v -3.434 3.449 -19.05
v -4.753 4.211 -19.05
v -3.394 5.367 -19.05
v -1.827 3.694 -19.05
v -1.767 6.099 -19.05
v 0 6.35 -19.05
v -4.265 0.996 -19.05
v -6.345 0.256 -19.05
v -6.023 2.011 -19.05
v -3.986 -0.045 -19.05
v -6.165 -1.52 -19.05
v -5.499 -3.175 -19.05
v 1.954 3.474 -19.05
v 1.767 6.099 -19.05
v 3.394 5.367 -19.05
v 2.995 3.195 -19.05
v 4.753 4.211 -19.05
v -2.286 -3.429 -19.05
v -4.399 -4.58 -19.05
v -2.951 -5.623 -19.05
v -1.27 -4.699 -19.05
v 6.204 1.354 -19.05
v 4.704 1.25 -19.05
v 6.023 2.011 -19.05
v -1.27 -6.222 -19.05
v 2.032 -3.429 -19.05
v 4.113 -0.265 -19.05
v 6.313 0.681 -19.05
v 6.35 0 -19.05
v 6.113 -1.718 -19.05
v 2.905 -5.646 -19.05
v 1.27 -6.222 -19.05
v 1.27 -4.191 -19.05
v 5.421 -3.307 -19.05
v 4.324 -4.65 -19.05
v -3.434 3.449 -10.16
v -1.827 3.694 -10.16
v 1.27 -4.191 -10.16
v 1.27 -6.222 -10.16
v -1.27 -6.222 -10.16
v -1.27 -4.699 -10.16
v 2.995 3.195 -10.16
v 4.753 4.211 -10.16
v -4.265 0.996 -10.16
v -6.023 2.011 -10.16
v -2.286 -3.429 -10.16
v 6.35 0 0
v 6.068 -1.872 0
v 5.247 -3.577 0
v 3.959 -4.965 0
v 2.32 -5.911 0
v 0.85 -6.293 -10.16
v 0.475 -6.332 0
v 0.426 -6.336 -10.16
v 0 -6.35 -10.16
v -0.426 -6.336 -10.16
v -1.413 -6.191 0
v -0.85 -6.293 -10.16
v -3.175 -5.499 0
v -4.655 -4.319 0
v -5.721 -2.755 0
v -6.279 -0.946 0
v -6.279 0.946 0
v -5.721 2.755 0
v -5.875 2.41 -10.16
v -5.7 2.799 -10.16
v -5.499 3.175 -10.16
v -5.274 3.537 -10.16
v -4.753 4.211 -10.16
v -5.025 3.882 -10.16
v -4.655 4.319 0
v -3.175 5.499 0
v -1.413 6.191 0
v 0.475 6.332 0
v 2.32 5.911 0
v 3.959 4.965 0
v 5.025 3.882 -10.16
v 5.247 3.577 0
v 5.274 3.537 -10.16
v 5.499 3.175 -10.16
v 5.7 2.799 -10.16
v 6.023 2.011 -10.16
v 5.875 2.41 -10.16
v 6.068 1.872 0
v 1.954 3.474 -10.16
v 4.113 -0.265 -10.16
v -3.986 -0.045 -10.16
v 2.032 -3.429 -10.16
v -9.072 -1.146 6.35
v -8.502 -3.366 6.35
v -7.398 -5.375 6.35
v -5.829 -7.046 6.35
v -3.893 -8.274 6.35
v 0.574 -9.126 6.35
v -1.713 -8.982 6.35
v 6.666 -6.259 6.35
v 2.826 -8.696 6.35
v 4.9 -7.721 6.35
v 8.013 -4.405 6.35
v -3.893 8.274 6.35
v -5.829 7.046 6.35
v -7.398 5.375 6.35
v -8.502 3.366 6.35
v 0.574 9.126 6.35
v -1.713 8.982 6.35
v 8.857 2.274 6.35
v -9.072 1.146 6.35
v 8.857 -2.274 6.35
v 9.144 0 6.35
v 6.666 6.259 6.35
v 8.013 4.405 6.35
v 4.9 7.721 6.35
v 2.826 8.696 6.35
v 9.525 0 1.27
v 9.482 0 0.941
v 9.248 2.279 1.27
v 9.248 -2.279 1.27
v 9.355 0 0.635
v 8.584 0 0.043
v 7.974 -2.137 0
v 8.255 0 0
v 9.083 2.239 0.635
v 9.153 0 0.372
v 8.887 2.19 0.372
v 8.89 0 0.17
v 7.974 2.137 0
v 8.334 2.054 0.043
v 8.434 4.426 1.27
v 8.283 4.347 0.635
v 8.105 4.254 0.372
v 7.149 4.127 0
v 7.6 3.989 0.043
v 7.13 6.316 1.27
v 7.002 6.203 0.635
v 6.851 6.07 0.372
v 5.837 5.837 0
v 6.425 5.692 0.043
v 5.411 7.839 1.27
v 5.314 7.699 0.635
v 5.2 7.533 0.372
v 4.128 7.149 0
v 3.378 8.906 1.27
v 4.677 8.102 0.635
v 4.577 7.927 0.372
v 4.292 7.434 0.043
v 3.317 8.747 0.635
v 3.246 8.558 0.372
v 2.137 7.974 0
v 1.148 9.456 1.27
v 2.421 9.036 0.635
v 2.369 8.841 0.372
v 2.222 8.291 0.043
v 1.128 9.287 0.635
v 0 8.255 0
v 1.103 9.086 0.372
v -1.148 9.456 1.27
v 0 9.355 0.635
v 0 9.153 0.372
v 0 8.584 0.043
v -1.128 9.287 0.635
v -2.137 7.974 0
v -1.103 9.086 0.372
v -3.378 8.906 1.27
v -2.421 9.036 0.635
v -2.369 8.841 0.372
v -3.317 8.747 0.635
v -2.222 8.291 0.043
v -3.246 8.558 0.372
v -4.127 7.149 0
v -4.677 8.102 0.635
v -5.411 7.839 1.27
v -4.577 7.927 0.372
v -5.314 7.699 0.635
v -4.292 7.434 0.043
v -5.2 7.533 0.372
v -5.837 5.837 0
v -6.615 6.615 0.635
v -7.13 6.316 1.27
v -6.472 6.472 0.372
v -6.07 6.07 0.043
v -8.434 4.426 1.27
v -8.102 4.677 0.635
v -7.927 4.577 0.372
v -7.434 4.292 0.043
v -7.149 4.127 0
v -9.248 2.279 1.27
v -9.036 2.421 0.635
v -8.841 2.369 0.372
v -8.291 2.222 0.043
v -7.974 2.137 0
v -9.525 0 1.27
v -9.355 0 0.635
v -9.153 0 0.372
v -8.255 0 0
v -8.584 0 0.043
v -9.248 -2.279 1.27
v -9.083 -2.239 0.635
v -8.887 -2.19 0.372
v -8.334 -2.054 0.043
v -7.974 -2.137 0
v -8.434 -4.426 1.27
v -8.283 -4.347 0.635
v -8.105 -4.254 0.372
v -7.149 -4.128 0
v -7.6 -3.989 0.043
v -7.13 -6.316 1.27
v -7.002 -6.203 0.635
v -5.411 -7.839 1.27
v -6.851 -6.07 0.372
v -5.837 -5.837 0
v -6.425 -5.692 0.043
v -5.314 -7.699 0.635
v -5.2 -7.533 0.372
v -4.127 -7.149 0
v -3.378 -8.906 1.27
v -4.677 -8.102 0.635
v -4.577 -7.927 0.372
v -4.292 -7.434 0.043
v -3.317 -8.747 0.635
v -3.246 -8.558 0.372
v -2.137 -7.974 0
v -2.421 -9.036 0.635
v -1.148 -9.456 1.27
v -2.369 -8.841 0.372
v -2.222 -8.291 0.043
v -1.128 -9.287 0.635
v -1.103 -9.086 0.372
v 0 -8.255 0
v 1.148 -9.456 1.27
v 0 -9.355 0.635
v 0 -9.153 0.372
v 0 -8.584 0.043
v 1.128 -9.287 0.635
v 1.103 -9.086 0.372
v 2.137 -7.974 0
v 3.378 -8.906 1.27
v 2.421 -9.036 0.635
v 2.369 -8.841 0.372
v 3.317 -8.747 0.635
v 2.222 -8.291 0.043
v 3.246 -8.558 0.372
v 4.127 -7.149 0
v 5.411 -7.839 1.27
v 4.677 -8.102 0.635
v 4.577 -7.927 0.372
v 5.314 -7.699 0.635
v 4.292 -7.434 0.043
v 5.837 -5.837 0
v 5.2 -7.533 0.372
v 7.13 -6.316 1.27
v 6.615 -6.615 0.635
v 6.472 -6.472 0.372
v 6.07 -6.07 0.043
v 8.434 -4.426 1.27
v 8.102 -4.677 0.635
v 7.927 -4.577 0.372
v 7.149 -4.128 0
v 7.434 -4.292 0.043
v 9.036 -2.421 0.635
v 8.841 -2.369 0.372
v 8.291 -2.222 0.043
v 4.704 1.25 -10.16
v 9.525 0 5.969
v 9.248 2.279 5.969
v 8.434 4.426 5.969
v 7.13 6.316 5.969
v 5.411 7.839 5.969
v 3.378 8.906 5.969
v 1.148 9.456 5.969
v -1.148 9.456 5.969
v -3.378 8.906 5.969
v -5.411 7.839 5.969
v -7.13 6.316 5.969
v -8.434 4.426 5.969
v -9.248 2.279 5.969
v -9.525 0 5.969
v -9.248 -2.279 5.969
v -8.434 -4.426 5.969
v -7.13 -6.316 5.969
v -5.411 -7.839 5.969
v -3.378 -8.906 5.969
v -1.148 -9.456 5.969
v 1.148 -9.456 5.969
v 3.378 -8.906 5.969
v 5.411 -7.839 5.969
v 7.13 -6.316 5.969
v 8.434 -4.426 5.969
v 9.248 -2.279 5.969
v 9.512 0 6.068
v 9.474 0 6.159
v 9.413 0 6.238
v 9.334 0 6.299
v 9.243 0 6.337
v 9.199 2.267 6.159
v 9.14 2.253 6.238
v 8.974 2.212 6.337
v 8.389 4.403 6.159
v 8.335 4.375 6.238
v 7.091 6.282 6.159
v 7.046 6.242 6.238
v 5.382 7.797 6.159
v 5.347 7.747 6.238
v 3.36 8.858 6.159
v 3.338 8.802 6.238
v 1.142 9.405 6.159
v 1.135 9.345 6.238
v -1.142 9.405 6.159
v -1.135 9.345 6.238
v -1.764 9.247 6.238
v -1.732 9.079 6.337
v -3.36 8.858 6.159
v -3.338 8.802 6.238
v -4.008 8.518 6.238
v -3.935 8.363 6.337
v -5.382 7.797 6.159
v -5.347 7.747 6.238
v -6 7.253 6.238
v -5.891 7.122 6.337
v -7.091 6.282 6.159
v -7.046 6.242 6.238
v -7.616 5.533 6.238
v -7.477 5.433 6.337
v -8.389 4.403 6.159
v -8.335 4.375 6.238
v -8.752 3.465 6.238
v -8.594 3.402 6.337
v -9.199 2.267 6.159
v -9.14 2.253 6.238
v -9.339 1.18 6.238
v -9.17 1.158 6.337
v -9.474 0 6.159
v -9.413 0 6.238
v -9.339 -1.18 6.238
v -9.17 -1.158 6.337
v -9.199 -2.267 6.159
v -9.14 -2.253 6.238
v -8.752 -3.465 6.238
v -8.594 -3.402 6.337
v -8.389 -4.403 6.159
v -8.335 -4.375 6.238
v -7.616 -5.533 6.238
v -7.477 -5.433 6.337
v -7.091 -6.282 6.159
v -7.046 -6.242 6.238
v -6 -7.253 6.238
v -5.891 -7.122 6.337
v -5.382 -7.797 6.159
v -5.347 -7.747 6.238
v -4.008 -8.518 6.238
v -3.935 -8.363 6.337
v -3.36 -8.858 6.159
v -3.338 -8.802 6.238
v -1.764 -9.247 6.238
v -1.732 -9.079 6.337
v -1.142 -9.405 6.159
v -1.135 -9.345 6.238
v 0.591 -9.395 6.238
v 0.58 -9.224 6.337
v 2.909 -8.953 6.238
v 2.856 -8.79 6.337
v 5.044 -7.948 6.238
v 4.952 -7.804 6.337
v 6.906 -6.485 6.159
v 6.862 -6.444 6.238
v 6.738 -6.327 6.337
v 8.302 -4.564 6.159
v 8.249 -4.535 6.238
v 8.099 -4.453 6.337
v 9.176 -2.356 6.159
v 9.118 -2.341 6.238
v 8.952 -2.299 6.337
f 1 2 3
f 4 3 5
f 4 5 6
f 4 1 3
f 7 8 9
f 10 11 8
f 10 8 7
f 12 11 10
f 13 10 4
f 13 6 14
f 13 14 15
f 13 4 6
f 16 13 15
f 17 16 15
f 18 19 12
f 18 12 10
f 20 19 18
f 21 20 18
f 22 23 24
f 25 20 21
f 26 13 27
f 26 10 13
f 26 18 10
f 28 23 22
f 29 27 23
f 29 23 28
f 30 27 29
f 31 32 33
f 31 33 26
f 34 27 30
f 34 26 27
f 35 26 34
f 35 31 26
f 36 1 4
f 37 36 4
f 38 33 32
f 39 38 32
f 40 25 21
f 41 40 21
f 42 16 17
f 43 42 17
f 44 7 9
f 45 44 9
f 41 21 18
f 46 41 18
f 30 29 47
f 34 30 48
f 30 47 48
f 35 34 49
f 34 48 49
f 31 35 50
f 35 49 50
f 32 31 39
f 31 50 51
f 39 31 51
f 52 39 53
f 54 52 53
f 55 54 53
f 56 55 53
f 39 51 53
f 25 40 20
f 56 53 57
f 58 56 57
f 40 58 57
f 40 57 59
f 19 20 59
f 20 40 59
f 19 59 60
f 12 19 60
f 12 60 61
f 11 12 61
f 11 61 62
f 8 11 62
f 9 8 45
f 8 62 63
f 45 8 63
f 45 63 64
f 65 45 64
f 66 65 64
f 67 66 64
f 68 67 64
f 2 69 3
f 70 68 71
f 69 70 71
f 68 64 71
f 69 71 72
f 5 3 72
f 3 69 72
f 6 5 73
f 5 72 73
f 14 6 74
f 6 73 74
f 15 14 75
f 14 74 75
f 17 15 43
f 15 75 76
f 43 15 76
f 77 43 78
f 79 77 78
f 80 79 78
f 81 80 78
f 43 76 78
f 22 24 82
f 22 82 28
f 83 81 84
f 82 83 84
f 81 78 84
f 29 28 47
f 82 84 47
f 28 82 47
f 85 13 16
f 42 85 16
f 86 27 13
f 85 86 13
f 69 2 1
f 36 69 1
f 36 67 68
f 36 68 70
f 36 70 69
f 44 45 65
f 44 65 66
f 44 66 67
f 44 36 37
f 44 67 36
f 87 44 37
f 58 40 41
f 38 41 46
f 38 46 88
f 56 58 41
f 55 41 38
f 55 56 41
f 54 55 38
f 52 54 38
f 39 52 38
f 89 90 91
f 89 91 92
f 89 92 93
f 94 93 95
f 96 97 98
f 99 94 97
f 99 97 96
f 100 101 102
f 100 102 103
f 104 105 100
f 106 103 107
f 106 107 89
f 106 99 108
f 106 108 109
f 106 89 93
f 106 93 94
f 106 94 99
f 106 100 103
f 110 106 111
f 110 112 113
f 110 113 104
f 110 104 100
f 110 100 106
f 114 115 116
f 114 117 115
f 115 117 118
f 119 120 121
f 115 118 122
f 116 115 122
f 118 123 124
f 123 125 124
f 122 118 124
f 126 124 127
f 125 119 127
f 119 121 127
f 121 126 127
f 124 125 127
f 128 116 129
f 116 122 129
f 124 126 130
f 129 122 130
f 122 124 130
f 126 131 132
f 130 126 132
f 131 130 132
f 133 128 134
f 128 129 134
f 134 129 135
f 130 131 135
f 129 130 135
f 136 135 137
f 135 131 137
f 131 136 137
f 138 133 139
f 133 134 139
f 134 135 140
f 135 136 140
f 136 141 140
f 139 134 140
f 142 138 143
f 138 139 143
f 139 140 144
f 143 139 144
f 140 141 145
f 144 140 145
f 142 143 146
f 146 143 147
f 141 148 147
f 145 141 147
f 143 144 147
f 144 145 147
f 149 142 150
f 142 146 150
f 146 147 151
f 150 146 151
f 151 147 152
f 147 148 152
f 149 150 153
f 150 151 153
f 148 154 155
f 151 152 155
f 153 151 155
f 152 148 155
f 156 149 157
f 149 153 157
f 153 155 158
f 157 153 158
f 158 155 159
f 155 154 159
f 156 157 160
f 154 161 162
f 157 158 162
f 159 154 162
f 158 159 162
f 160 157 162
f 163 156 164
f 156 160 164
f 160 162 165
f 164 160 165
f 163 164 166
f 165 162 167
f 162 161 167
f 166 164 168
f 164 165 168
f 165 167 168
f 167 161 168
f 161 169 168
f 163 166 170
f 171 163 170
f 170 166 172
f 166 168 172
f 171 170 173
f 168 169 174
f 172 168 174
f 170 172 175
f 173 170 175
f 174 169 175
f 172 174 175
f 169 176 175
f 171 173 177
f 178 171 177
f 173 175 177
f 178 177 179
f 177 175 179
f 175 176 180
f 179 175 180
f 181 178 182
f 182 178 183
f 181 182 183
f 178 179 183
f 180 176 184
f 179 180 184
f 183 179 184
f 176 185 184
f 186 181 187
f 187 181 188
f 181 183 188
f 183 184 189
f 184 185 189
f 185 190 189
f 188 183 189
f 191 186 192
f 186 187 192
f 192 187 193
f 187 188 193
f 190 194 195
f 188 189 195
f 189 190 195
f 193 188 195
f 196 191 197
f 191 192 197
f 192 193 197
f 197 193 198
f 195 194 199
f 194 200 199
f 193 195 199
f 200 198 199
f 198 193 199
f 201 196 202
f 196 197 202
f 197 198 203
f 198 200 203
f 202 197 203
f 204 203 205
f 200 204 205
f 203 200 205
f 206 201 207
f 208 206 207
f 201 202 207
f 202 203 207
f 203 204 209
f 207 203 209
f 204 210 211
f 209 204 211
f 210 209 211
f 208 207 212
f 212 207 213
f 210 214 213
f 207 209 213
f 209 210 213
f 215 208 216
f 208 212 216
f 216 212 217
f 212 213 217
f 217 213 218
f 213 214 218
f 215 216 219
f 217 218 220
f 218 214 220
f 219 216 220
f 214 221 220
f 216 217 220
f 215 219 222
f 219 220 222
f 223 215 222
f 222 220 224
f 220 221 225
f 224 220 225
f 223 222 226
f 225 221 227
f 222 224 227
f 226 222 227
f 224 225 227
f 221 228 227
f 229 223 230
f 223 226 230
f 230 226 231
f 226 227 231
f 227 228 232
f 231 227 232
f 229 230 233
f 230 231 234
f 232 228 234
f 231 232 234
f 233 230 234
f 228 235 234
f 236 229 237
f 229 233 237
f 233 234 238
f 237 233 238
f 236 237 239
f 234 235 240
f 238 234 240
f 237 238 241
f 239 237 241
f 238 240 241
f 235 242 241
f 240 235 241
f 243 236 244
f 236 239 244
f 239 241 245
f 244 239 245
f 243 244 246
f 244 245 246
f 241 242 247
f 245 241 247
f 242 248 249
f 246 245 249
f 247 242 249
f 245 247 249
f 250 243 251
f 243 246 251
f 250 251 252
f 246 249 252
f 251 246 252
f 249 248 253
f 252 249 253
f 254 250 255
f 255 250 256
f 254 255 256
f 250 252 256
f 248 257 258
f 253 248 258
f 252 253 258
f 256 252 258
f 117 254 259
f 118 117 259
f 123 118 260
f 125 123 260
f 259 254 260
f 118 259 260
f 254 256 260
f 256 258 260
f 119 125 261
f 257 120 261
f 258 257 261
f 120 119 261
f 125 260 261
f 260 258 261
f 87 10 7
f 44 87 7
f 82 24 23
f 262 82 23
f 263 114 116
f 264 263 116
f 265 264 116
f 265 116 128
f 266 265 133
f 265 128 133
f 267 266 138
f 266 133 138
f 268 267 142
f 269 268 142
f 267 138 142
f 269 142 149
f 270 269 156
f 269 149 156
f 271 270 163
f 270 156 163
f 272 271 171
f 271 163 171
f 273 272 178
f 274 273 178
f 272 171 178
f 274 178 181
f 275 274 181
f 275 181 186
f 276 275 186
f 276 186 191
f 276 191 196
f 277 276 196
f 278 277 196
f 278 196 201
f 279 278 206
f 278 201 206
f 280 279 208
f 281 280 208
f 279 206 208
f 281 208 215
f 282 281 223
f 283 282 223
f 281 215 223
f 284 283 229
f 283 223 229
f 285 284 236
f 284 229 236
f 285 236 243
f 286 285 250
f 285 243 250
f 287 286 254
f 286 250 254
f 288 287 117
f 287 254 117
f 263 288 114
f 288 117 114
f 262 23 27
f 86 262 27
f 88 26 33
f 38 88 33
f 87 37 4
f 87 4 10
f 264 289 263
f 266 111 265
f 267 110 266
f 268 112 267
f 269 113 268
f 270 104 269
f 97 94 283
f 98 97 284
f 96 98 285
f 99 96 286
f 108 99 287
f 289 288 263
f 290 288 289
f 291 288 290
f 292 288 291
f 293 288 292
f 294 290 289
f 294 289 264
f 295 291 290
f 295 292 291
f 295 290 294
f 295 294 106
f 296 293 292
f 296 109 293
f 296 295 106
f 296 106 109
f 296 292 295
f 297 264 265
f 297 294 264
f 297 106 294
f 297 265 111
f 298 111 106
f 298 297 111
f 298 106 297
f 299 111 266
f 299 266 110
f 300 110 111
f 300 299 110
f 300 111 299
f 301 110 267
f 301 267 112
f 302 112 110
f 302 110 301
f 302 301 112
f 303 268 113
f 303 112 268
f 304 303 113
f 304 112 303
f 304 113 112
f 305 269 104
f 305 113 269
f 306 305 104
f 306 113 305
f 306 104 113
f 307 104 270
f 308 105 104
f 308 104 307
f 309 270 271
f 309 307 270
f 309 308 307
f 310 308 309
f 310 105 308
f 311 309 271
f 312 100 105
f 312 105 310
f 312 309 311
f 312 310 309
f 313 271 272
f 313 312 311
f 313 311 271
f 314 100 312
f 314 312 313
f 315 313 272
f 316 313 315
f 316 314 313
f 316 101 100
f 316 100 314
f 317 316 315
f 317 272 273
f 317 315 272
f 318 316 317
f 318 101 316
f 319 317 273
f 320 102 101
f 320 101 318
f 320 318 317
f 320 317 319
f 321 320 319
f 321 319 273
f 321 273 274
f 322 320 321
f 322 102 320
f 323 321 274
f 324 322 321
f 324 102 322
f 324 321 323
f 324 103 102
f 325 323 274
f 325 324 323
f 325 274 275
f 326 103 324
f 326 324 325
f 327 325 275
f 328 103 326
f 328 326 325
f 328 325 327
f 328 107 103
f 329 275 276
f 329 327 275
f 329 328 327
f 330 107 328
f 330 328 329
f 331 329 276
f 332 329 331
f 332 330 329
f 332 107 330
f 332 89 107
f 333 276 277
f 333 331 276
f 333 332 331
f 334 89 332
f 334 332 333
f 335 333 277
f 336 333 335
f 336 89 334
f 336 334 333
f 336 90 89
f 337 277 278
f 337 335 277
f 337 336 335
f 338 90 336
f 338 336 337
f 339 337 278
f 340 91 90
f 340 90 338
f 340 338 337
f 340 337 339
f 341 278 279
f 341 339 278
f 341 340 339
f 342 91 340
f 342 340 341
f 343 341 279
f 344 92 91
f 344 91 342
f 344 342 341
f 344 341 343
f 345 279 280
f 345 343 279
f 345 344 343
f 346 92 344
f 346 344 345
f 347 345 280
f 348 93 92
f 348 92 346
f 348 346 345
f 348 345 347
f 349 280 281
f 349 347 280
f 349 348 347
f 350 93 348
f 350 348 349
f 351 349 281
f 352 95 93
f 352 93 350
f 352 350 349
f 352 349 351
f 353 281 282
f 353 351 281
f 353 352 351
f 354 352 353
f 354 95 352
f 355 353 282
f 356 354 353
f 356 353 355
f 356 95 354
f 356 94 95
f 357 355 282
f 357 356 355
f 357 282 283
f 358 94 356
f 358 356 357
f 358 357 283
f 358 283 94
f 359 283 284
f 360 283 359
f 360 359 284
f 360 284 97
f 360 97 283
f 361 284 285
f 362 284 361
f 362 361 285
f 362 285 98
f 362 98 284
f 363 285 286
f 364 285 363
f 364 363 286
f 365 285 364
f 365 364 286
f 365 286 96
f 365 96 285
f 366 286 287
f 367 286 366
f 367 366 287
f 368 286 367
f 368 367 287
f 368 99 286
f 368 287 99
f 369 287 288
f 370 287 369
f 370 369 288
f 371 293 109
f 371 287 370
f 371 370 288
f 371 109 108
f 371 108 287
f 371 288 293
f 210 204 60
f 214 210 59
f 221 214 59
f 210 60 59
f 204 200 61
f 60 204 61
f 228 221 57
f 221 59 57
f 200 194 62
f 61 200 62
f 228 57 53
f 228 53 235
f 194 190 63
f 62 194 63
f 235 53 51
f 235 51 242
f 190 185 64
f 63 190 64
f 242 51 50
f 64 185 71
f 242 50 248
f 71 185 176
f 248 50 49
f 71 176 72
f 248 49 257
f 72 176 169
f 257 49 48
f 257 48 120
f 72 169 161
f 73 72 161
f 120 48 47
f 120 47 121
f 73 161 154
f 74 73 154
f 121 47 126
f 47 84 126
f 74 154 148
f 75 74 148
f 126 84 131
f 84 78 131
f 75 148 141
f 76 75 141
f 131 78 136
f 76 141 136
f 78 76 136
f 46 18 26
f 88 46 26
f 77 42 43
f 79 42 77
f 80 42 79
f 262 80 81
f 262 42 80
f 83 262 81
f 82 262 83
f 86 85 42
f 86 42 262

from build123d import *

# Parameters (mm, degrees)
F0_R     = 9.525
F1_DEPTH = 6.35
F2_R     = 6.35
F3_DEPTH = 19.05
F5_DEPTH = 8.89
F6_R     = 1.27
F7_R     = 0.381


with BuildPart() as f1:
    # F0 (on Top) → F1 (new body)
    with BuildSketch(Plane.XY):
        Circle(F0_R)
    extrude(amount=F1_DEPTH)

    # F2 (on face) → F3 (join)
    with BuildSketch(Plane(origin=(0, 0, 0), x_dir=(1, 0, 0), z_dir=(0, 0, -1))):
        Circle(F2_R)
    extrude(amount=F3_DEPTH)

    # F4 (on face) → F5 (cut)
    with BuildSketch(Plane(origin=(0, 0, -19.05), x_dir=(1, 0, 0), z_dir=(0, 0, -1))):
        with BuildLine():
            ThreePointArc((1.27, 6.2217039467), (0.6382319087, 6.3178445716), (0, 6.35))
            ThreePointArc((0, 6.35), (-0.6382319087, 6.3178445716), (-1.27, 6.2217039467))
            Line((-1.27, 6.2217039467), (-1.27, 4.699))
            Line((-1.27, 4.699), (-2.286, 3.429))
            Line((-2.286, 3.429), (1.27, 3.429))
            Line((1.27, 3.429), (2.032, 3.429))
            Line((2.032, 3.429), (1.27, 4.191))
            Line((1.27, 4.191), (1.27, 6.2217039467))
        make_face()
        with BuildLine():
            Line((-4.2645124673, -0.9956477372), (-6.0231536726, -2.0109997105))
            ThreePointArc((-6.0231536726, -2.0109997105), (-5.7905298505, -2.6061972393), (-5.499261314, -3.175))
            ThreePointArc((-5.499261314, -3.175), (-5.1522979418, -3.7116473323), (-4.7531536726, -4.2107042361))
            Line((-4.7531536726, -4.2107042361), (-3.4344533724, -3.4493522628))
            Line((-3.4344533724, -3.4493522628), (-1.8266011096, -3.6942340731))
            Line((-1.8266011096, -3.6942340731), (-3.9856011096, 0.0452636205))
            Line((-3.9856011096, 0.0452636205), (-4.2645124673, -0.9956477372))
        make_face()
        with BuildLine():
            ThreePointArc((5.499261314, -3.175), (5.7905298505, -2.6061972393), (6.0231536726, -2.0109997105))
            Line((6.0231536726, -2.0109997105), (4.7044533724, -1.2496477372))
            Line((4.7044533724, -1.2496477372), (4.1126011096, 0.2652340731))
            Line((4.1126011096, 0.2652340731), (1.9536011096, -3.4742636205))
            Line((1.9536011096, -3.4742636205), (2.9945124673, -3.1953522628))
            Line((2.9945124673, -3.1953522628), (4.7531536726, -4.2107042361))
            ThreePointArc((4.7531536726, -4.2107042361), (5.1522979418, -3.7116473323), (5.499261314, -3.175))
        make_face()
    extrude(amount=-F5_DEPTH, mode=Mode.SUBTRACT)

    # F6
    f6_edges = [f1.edges().sort_by_distance(p)[0] for p in [
        (-9.525, 0, 0),
    ]]
    fillet(f6_edges, radius=F6_R)

    # F7
    f7_edges = [f1.edges().sort_by_distance(p)[0] for p in [
        (-9.525, 0, 6.35),
    ]]
    fillet(f7_edges, radius=F7_R)


solid = f1.part
